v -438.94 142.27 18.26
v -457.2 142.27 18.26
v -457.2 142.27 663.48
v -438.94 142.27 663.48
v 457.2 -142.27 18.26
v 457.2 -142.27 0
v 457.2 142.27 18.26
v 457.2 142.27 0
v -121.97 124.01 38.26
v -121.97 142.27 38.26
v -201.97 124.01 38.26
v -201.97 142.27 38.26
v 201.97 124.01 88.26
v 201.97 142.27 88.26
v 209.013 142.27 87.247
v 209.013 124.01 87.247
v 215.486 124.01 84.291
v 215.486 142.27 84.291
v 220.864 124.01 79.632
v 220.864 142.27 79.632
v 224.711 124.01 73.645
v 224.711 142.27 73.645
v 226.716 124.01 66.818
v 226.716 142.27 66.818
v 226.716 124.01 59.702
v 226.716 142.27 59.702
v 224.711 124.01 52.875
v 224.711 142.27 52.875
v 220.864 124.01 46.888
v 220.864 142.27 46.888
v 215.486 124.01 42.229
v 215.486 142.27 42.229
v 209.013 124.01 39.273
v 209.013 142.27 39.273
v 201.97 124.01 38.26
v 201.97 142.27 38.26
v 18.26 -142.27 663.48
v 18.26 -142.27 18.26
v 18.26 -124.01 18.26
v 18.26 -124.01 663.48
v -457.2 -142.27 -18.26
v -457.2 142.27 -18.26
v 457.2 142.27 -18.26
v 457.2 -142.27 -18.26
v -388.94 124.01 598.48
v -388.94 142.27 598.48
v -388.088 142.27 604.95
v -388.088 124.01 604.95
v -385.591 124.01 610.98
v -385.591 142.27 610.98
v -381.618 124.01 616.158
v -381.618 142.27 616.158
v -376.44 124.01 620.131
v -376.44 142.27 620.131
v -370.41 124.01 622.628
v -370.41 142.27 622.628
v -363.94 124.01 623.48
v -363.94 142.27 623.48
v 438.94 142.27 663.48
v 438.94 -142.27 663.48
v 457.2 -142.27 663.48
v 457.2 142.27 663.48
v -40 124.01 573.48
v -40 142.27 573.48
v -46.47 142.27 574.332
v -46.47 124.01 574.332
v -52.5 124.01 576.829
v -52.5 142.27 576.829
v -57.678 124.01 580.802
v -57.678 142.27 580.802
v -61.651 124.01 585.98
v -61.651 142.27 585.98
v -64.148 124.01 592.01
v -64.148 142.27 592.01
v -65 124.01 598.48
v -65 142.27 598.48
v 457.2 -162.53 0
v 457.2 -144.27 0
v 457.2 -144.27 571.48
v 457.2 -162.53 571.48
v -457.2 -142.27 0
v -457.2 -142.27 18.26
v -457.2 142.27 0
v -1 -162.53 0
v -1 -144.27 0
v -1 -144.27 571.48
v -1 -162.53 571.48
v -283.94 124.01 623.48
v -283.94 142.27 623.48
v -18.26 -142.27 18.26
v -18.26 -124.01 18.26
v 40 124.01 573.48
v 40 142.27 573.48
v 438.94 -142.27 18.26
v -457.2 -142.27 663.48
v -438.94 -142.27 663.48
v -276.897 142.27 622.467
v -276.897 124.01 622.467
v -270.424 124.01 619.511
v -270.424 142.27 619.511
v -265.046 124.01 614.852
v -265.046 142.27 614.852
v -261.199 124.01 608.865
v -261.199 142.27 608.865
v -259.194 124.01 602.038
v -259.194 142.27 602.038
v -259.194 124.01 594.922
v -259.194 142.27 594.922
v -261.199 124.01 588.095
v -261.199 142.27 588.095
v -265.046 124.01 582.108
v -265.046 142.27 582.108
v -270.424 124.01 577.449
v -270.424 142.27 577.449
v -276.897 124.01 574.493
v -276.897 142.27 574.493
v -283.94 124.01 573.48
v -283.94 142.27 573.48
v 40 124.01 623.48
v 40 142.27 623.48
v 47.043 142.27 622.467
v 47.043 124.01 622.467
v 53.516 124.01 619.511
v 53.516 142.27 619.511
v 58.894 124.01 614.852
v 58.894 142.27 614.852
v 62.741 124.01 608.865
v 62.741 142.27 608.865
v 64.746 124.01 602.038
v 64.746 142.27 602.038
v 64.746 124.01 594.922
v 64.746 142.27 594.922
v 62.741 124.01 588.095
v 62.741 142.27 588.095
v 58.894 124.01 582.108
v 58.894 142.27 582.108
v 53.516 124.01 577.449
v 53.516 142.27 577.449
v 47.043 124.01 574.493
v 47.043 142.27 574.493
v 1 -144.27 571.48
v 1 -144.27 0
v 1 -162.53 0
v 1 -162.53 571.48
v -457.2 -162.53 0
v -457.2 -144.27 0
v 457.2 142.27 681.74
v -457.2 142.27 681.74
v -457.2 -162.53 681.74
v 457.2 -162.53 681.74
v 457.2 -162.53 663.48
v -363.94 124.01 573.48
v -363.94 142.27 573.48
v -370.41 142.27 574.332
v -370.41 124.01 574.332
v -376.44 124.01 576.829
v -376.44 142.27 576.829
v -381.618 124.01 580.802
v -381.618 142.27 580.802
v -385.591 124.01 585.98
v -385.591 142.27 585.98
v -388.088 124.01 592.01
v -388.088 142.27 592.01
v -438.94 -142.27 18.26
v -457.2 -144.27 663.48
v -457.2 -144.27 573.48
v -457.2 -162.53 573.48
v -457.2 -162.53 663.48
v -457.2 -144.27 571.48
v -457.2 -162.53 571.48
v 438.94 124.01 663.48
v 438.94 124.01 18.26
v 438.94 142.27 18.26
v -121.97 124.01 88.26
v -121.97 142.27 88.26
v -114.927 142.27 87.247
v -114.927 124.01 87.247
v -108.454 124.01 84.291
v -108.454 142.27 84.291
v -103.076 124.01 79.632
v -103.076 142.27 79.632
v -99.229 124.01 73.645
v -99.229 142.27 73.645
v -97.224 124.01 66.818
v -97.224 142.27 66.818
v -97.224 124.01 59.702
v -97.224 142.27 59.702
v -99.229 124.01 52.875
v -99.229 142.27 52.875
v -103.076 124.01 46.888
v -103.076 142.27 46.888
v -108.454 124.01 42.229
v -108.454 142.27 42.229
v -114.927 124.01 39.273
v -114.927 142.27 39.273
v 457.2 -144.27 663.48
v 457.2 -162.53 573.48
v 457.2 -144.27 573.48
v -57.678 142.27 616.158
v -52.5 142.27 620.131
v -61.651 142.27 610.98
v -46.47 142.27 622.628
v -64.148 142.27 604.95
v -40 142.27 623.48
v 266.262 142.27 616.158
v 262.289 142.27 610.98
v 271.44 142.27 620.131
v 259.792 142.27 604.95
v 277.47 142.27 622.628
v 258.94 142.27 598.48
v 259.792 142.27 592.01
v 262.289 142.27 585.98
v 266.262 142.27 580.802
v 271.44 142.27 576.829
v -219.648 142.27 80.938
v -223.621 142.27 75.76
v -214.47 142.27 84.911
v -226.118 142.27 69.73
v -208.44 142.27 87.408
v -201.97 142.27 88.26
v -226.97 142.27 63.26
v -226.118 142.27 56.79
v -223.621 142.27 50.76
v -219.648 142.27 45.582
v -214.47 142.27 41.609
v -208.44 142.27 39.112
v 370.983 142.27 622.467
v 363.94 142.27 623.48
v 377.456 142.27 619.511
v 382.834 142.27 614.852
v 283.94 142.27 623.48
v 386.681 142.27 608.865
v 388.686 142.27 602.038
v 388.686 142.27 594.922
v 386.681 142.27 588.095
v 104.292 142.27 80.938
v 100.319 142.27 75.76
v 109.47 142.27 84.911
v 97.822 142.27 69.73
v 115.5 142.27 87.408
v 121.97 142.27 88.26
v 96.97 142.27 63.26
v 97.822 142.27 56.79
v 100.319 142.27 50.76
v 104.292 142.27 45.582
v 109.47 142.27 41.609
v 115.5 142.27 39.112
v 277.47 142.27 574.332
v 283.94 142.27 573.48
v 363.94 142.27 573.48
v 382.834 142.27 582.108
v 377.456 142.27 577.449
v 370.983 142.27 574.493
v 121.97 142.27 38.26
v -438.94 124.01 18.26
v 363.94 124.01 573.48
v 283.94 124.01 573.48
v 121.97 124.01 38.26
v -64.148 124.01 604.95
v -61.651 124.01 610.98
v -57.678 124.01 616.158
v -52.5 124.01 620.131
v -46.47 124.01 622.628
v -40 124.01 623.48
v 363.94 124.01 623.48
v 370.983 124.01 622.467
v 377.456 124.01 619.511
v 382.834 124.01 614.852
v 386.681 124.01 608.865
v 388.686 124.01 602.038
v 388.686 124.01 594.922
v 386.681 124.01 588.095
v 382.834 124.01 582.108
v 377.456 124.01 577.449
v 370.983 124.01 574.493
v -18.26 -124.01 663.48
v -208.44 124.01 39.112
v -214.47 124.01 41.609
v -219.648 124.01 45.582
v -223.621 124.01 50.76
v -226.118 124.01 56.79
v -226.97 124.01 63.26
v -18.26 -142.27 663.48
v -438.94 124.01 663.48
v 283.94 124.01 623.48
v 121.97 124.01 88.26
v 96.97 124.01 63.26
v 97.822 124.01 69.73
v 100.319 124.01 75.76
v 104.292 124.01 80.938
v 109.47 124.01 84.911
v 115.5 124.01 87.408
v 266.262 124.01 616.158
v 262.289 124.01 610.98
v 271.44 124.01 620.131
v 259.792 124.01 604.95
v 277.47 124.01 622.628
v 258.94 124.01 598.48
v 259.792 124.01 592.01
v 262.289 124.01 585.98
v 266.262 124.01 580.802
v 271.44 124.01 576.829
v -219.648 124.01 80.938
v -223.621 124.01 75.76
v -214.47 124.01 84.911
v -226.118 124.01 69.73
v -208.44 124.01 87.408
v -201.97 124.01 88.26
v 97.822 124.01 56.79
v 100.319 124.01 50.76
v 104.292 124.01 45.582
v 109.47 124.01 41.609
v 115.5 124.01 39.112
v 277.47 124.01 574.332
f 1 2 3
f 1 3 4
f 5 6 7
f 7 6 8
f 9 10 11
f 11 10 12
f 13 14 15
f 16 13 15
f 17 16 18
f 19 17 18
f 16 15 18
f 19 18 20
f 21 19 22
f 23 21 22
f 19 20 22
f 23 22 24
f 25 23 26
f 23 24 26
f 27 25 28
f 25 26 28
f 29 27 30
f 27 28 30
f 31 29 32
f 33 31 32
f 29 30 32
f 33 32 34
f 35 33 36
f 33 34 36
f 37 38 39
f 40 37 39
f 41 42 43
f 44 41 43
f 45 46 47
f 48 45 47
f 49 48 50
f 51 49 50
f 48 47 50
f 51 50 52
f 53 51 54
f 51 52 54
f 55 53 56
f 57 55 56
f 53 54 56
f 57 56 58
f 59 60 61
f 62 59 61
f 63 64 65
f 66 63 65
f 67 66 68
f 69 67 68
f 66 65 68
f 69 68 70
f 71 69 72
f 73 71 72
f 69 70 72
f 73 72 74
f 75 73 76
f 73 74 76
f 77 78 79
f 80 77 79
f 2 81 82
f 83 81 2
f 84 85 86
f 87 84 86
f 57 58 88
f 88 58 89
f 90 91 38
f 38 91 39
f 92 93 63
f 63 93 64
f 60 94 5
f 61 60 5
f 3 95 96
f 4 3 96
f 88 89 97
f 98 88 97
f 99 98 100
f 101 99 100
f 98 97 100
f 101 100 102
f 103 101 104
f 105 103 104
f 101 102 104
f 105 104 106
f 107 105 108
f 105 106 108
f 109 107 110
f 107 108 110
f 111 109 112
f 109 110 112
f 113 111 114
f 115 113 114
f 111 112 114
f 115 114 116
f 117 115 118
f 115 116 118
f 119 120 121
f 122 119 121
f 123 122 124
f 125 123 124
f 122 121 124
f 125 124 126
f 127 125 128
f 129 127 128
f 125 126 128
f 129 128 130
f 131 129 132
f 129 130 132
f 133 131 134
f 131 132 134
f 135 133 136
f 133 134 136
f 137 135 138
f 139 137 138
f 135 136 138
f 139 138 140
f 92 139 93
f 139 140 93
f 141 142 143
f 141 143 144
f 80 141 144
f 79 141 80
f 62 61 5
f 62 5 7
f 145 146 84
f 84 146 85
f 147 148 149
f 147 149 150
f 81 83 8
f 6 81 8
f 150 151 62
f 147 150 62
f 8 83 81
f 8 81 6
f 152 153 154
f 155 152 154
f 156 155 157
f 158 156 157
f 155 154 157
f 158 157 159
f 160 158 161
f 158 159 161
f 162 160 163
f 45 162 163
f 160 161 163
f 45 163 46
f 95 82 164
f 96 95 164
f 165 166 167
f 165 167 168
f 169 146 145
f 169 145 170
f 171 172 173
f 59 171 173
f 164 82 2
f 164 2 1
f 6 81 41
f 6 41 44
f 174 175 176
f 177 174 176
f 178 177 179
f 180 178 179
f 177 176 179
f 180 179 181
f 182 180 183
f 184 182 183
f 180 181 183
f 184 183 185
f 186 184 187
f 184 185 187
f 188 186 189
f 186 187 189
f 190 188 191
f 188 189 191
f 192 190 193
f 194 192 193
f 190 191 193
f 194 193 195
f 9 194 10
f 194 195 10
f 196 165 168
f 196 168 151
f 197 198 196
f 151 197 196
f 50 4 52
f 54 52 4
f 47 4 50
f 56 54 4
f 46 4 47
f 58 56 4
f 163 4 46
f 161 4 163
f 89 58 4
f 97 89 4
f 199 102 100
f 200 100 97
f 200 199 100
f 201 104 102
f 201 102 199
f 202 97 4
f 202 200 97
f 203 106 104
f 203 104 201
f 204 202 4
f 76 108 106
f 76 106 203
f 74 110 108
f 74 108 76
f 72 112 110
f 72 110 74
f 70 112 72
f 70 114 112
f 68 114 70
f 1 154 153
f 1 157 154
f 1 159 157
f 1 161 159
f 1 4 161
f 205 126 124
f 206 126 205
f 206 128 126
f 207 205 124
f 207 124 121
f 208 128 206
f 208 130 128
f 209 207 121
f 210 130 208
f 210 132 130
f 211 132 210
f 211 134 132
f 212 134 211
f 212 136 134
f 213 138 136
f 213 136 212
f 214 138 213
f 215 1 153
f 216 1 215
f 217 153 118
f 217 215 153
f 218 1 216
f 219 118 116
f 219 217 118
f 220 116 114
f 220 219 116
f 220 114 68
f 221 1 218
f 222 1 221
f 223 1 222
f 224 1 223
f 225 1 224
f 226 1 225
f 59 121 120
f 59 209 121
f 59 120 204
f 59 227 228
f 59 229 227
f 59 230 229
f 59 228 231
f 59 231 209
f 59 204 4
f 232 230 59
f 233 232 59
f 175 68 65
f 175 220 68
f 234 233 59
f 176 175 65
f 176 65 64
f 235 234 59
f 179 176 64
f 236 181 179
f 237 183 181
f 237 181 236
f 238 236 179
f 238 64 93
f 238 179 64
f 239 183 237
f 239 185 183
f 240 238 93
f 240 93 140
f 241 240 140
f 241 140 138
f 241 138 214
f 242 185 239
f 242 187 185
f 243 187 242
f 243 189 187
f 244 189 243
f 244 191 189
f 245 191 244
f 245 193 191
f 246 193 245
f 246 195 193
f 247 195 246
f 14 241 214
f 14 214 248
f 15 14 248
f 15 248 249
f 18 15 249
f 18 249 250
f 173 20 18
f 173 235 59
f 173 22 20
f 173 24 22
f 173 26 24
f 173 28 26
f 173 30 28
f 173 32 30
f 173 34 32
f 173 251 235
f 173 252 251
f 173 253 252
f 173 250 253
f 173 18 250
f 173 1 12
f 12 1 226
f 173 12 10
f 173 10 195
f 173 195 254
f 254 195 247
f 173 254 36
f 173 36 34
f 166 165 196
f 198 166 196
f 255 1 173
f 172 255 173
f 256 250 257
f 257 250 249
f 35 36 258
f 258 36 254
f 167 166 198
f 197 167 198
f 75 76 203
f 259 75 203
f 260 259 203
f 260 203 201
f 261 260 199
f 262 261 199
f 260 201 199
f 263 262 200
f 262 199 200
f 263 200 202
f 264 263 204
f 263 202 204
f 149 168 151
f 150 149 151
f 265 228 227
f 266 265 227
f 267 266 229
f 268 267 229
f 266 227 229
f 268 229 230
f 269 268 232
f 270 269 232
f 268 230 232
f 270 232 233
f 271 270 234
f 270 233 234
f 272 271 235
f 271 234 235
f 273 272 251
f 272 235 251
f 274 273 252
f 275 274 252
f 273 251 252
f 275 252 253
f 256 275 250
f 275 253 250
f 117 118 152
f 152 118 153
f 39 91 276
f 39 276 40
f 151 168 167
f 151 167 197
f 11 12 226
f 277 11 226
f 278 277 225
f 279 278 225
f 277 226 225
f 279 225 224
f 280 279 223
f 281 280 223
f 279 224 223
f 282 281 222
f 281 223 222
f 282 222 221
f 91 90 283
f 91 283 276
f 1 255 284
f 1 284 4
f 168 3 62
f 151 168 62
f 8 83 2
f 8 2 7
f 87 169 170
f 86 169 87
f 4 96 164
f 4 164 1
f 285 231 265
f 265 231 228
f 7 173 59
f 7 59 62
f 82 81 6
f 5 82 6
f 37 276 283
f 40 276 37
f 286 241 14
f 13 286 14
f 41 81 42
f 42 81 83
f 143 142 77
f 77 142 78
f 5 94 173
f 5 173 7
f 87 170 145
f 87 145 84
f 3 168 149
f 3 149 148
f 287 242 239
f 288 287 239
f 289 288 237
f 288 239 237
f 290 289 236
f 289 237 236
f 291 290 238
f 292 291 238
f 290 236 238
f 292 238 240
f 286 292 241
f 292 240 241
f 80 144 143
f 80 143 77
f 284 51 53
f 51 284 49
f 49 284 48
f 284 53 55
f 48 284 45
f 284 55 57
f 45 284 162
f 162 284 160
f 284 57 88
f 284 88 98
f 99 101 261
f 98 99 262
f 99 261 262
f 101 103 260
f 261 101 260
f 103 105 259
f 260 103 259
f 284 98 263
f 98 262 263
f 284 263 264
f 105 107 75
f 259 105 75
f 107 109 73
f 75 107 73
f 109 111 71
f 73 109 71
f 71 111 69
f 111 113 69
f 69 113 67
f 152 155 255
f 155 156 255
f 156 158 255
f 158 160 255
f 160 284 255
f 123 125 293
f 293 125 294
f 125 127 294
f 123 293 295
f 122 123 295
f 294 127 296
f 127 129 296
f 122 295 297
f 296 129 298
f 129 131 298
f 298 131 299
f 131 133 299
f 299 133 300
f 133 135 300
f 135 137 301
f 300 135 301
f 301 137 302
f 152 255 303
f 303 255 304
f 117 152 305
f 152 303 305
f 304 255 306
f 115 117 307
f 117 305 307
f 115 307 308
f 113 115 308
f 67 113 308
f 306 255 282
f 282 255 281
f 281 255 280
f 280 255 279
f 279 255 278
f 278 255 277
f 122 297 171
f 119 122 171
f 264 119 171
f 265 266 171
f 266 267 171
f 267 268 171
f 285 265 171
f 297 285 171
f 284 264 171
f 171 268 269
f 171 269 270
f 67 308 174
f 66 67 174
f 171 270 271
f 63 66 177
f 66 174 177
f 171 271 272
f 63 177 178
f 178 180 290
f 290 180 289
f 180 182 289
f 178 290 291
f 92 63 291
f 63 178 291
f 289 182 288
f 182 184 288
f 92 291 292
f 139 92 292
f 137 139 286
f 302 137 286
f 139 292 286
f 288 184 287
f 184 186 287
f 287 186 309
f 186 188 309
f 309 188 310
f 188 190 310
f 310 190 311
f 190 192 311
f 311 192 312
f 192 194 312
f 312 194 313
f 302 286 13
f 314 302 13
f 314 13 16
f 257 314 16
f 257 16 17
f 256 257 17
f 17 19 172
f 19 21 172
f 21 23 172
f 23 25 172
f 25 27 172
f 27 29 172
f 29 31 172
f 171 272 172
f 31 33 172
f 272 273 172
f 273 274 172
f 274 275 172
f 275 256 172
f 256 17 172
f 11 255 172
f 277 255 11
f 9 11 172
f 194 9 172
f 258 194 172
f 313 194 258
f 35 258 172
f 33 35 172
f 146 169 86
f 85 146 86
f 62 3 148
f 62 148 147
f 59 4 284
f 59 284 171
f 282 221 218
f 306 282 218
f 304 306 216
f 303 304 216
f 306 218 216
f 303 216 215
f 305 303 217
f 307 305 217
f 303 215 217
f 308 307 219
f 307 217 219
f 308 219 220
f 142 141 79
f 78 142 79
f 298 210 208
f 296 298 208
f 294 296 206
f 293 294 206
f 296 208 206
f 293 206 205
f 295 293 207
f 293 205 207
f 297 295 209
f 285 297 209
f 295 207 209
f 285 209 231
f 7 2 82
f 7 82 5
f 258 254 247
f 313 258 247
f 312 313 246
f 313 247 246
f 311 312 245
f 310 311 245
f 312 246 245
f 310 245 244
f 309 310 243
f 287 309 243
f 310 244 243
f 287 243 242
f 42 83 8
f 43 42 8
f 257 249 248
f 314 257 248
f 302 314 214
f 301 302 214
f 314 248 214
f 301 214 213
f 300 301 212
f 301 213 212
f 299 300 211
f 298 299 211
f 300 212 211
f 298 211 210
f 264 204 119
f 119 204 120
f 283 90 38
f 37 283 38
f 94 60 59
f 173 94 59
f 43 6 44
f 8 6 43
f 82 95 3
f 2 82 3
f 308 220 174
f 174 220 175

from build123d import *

# Parameters (mm, degrees)
F0_W      = 914.4
F0_H      = 284.54
F1_DEPTH  = 18.26
F2_W      = 18.26
F2_H      = 284.54
F3_DEPTH  = 645.22
F4_W      = 877.88
F4_H      = 18.26
F5_DEPTH  = 645.22
F6_W      = 36.52
F6_H      = 18.26
F7_DEPTH  = 645.22
F8_DEPTH  = 18.26
F10_W     = 914.4
F10_H     = 90
F11_DEPTH = 18.26
F12_W     = 914.4
F12_H     = 304.8
F13_DEPTH = 18.26
F14_W     = 456.2
F14_H     = 571.48
F15_DEPTH = 18.26
F17_DEPTH = 25


with BuildPart() as f1:
    # F0 (on Top) → F1 (new body)
    with BuildSketch(Plane.XY):
        Rectangle(F0_W, F0_H)
    extrude(amount=F1_DEPTH)


with BuildPart() as f3:
    # F2 (on face) → F3 (new body)
    with BuildSketch(Plane.XY.offset(18.26)):
        with Locations((448.07, 0)):
            Rectangle(F2_W, F2_H)
    extrude(amount=F3_DEPTH)


with BuildPart() as f3b:
    # F2 (on face) → F3, piece 2 (new body)
    with BuildSketch(Plane.XY.offset(18.26)):
        with Locations((-448.07, 0)):
            Rectangle(F2_W, F2_H)
    extrude(amount=F3_DEPTH)


with BuildPart() as f5:
    # F4 (on face) → F5 (new body, through all)
    with BuildSketch(Plane.XY.offset(18.26)):
        with Locations((0, 133.14)):
            Rectangle(F4_W, F4_H)
    extrude(amount=F5_DEPTH)

    # F16 (on face) → F17 (cut)
    with BuildSketch(Plane(origin=(0, 142.27, 0), x_dir=(-1, 0, 0), z_dir=(0, 1, 0))):
        with BuildLine():
            ThreePointArc((-363.94, 573.48), (-346.2623304703, 580.8023304703), (-338.94, 598.48))
            ThreePointArc((-338.94, 598.48), (-346.2623304703, 616.1576695297), (-363.94, 623.48))
            ThreePointArc((-363.94, 623.48), (-388.94, 598.48), (-363.94, 573.48))
        make_face()
        with BuildLine():
            ThreePointArc((-363.94, 623.48), (-346.2623304703, 616.1576695297), (-338.94, 598.48))
            ThreePointArc((-338.94, 598.48), (-346.2623304703, 580.8023304703), (-363.94, 573.48))
            Line((-363.94, 573.48), (-283.94, 573.48))
            ThreePointArc((-283.94, 573.48), (-308.94, 598.48), (-283.94, 623.48))
            Line((-283.94, 623.48), (-363.94, 623.48))
        make_face()
        with BuildLine():
            ThreePointArc((-258.94, 598.48), (-266.2623304703, 616.1576695297), (-283.94, 623.48))
            ThreePointArc((-283.94, 623.48), (-308.94, 598.48), (-283.94, 573.48))
            ThreePointArc((-283.94, 573.48), (-266.2623304703, 580.8023304703), (-258.94, 598.48))
        make_face()
        with BuildLine():
            ThreePointArc((40, 573.48), (57.6776695297, 580.8023304703), (65, 598.48))
            ThreePointArc((65, 598.48), (57.6776695297, 616.1576695297), (40, 623.48))
            ThreePointArc((40, 623.48), (15, 598.48), (40, 573.48))
        make_face()
        with BuildLine():
            ThreePointArc((40, 573.48), (15, 598.48), (40, 623.48))
            Line((40, 623.48), (-40, 623.48))
            ThreePointArc((-40, 623.48), (-22.3223304703, 616.1576695297), (-15, 598.48))
            ThreePointArc((-15, 598.48), (-22.3223304703, 580.8023304703), (-40, 573.48))
            Line((-40, 573.48), (40, 573.48))
        make_face()
        with BuildLine():
            ThreePointArc((-15, 598.48), (-22.3223304703, 616.1576695297), (-40, 623.48))
            ThreePointArc((-40, 623.48), (-65, 598.48), (-40, 573.48))
            ThreePointArc((-40, 573.48), (-22.3223304703, 580.8023304703), (-15, 598.48))
        make_face()
        with BuildLine():
            ThreePointArc((363.94, 573.48), (381.6176695297, 580.8023304703), (388.94, 598.48))
            ThreePointArc((388.94, 598.48), (381.6176695297, 616.1576695297), (363.94, 623.48))
            ThreePointArc((363.94, 623.48), (338.94, 598.48), (363.94, 573.48))
        make_face()
        with BuildLine():
            ThreePointArc((363.94, 573.48), (338.94, 598.48), (363.94, 623.48))
            Line((363.94, 623.48), (283.94, 623.48))
            ThreePointArc((283.94, 623.48), (301.6176695297, 616.1576695297), (308.94, 598.48))
            ThreePointArc((308.94, 598.48), (301.6176695297, 580.8023304703), (283.94, 573.48))
            Line((283.94, 573.48), (363.94, 573.48))
        make_face()
        with BuildLine():
            ThreePointArc((308.94, 598.48), (301.6176695297, 616.1576695297), (283.94, 623.48))
            ThreePointArc((283.94, 623.48), (258.94, 598.48), (283.94, 573.48))
            ThreePointArc((283.94, 573.48), (301.6176695297, 580.8023304703), (308.94, 598.48))
        make_face()
        with BuildLine():
            ThreePointArc((121.97, 38.26), (139.6476695297, 45.5823304703), (146.97, 63.26))
            ThreePointArc((146.97, 63.26), (139.6476695297, 80.9376695297), (121.97, 88.26))
            ThreePointArc((121.97, 88.26), (96.97, 63.26), (121.97, 38.26))
        make_face()
        with BuildLine():
            ThreePointArc((121.97, 88.26), (139.6476695297, 80.9376695297), (146.97, 63.26))
            ThreePointArc((146.97, 63.26), (139.6476695297, 45.5823304703), (121.97, 38.26))
            Line((121.97, 38.26), (201.97, 38.26))
            ThreePointArc((201.97, 38.26), (176.97, 63.26), (201.97, 88.26))
            Line((201.97, 88.26), (121.97, 88.26))
        make_face()
        with BuildLine():
            ThreePointArc((226.97, 63.26), (219.6476695297, 80.9376695297), (201.97, 88.26))
            ThreePointArc((201.97, 88.26), (176.97, 63.26), (201.97, 38.26))
            ThreePointArc((201.97, 38.26), (219.6476695297, 45.5823304703), (226.97, 63.26))
        make_face()
        with BuildLine():
            ThreePointArc((-176.97, 63.26), (-184.2923304703, 45.5823304703), (-201.97, 38.26))
            Line((-201.97, 38.26), (-121.97, 38.26))
            ThreePointArc((-121.97, 38.26), (-146.97, 63.26), (-121.97, 88.26))
            Line((-121.97, 88.26), (-201.97, 88.26))
            ThreePointArc((-201.97, 88.26), (-184.2923304703, 80.9376695297), (-176.97, 63.26))
        make_face()
        with BuildLine():
            ThreePointArc((-201.97, 88.26), (-226.97, 63.26), (-201.97, 38.26))
            ThreePointArc((-201.97, 38.26), (-184.2923304703, 45.5823304703), (-176.97, 63.26))
            ThreePointArc((-176.97, 63.26), (-184.2923304703, 80.9376695297), (-201.97, 88.26))
        make_face()
        with BuildLine():
            ThreePointArc((-121.97, 88.26), (-146.97, 63.26), (-121.97, 38.26))
            ThreePointArc((-121.97, 38.26), (-104.2923304703, 45.5823304703), (-96.97, 63.26))
            ThreePointArc((-96.97, 63.26), (-104.2923304703, 80.9376695297), (-121.97, 88.26))
        make_face()
    extrude(amount=-F17_DEPTH, mode=Mode.SUBTRACT)


with BuildPart() as f7:
    # F6 (on face) → F7 (new body, through all)
    with BuildSketch(Plane.XY.offset(18.26)):
        with Locations((0, -133.14)):
            Rectangle(F6_W, F6_H)
    extrude(amount=F7_DEPTH)


with BuildPart() as f8:
    # F8 (new): a face of the model
    f8_faces = [f1.part.faces().sort_by_distance(p)[0] for p in [
        (0, 0, 0),
    ]]
    extrude(f8_faces, amount=F8_DEPTH)


with BuildPart() as f11:
    # F10 (on offset) → F11 (new body)
    with BuildSketch(Plane.XZ.offset(144.27)):
        with Locations((0, 618.48)):
            Rectangle(F10_W, F10_H)
    extrude(amount=F11_DEPTH)


with BuildPart() as f13:
    # F12 (on face) → F13 (new body)
    with BuildSketch(Plane.XY.offset(663.48)):
        with Locations((0, -10.13)):
            Rectangle(F12_W, F12_H)
    extrude(amount=F13_DEPTH)


with BuildPart() as f15:
    # F14 (on offset) → F15 (new body)
    with BuildSketch(Plane.XZ.offset(144.27)):
        with Locations((-229.1, 285.74)):
            Rectangle(F14_W, F14_H)
    extrude(amount=F15_DEPTH)


with BuildPart() as f15b:
    # F14 (on offset) → F15, piece 2 (new body)
    with BuildSketch(Plane.XZ.offset(144.27)):
        with Locations((229.1, 285.74)):
            Rectangle(F14_W, F14_H)
    extrude(amount=F15_DEPTH)


solid = Compound([f1.part, f3.part, f3b.part, f5.part, f7.part, f8.part, f11.part, f13.part, f15.part, f15b.part])
